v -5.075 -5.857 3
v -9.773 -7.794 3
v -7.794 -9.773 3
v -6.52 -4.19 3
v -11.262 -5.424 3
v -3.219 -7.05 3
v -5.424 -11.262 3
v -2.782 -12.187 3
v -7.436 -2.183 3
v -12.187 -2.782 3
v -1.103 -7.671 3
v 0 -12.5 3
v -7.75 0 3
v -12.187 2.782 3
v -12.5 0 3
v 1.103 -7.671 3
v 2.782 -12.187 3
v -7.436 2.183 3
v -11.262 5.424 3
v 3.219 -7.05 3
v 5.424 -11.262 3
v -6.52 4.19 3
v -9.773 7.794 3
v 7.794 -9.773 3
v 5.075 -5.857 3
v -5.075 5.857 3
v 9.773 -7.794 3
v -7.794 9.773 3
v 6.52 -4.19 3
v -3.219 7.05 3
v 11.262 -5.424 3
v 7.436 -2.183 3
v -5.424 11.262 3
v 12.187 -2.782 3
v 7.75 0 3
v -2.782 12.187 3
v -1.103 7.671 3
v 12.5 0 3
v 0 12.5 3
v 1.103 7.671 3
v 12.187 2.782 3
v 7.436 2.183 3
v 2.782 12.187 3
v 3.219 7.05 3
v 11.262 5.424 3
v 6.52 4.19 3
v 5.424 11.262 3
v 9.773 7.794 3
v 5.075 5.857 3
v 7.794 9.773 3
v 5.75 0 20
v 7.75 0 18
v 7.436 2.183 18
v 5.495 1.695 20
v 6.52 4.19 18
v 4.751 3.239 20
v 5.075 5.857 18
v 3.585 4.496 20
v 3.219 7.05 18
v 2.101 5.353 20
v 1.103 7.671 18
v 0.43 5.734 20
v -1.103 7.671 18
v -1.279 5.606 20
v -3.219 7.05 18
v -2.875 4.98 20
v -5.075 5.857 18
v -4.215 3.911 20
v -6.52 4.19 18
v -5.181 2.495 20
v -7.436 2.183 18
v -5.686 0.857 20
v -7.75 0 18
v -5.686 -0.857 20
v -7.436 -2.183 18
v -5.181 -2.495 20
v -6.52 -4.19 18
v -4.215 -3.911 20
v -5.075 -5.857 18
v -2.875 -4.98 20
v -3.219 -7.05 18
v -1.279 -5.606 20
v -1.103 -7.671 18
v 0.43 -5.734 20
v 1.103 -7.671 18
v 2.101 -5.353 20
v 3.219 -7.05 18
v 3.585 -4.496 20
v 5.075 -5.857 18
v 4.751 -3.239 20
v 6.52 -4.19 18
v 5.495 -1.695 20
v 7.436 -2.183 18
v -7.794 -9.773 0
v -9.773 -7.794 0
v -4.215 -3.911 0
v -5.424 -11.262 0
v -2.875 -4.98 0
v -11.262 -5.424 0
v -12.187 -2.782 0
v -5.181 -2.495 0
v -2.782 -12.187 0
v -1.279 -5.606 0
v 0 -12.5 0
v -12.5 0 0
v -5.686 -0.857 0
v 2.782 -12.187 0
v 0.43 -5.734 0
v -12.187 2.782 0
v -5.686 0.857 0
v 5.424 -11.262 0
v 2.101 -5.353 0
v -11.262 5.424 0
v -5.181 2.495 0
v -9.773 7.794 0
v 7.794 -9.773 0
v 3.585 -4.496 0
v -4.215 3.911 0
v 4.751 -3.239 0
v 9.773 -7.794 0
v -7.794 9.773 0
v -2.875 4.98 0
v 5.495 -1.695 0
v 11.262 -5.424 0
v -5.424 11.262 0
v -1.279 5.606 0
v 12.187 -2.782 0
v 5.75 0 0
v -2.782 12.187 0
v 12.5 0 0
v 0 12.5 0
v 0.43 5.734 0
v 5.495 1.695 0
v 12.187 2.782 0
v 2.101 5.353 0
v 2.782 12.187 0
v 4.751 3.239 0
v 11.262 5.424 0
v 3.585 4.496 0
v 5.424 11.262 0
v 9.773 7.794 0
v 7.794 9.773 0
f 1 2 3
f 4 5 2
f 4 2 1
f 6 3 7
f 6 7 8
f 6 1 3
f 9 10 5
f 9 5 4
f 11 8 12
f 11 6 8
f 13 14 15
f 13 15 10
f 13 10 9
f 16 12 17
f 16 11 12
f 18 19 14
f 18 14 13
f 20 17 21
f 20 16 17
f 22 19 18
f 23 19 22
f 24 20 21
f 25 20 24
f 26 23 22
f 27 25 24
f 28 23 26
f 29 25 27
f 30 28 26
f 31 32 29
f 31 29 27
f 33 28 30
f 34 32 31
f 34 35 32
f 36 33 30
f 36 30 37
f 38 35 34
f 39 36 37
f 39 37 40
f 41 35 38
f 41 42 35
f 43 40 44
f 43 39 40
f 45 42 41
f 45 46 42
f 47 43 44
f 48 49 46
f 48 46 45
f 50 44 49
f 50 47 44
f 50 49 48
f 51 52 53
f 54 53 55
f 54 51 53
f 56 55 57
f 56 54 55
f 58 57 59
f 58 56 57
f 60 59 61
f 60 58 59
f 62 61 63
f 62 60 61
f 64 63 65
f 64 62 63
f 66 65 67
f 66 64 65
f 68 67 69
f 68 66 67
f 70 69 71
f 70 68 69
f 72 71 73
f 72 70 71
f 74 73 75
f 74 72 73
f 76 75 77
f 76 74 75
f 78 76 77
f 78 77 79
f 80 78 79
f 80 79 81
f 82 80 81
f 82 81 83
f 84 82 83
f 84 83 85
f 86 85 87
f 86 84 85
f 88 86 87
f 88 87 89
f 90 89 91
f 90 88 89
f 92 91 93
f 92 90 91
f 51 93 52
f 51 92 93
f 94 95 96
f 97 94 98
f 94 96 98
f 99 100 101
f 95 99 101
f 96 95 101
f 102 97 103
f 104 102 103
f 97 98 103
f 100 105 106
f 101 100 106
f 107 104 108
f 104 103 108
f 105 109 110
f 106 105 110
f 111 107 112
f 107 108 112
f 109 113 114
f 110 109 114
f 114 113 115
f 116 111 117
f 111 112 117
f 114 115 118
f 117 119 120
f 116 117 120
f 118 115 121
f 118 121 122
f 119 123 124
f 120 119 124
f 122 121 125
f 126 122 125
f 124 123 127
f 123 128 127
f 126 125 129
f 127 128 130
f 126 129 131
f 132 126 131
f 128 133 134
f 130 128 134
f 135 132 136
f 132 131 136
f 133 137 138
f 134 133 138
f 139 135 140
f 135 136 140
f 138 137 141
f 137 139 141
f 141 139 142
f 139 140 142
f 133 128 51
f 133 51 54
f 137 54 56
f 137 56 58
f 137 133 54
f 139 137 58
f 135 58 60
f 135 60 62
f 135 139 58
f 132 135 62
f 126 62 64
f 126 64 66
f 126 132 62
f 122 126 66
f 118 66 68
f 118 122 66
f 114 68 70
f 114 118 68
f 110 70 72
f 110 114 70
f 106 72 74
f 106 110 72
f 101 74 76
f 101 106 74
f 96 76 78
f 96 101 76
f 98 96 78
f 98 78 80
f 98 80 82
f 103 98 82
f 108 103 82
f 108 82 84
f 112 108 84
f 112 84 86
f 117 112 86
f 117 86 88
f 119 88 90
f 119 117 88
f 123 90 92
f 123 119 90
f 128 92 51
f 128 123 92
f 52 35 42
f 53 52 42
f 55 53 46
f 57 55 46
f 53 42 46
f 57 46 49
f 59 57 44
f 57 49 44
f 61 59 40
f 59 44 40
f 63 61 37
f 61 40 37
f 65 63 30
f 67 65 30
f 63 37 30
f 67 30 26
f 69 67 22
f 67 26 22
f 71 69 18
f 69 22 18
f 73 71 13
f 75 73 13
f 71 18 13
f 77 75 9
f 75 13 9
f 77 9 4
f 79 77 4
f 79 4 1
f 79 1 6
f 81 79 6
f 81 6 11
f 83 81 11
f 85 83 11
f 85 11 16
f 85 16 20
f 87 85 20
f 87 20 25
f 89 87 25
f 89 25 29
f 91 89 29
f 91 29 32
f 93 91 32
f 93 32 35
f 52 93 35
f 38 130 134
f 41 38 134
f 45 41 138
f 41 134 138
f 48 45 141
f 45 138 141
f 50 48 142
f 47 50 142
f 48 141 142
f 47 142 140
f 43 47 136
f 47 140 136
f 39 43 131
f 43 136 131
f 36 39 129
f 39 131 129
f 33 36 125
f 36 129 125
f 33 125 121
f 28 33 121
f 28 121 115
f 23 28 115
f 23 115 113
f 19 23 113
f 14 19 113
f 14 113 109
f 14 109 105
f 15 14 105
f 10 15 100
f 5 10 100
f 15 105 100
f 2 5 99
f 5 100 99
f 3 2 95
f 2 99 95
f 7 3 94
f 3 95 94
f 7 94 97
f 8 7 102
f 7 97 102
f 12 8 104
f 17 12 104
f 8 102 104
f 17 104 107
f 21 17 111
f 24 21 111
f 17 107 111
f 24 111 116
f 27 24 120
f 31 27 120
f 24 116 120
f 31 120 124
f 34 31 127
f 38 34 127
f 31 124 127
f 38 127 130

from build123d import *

# Parameters (mm, degrees)
F0_R     = 7.75
F0_R_2   = 5.75
F1_DEPTH = 20
F2_R     = 12.5
F2_R_2   = 7.75
F3_DEPTH = 3
F4_SIZE  = 1.99999


# Not quite as in the source:
# - a fillet or chamfer is up to 0.001 mm smaller than in the source, because OpenCascade refuses the exact size


with BuildPart() as f1:
    # F0 (on Top) → F1 (new body)
    with BuildSketch(Plane.XY):
        Circle(F0_R)
        Circle(F0_R_2, mode=Mode.SUBTRACT)
    extrude(amount=F1_DEPTH)

    # F2 (on Top) → F3 (join)
    with BuildSketch(Plane.XY):
        Circle(F2_R)
        Circle(F2_R_2, mode=Mode.SUBTRACT)
    extrude(amount=F3_DEPTH)

    # F4 (size 2 in the source; OpenCascade refuses exactly that, so slightly less here)
    f4_edges = [f1.edges().sort_by_distance(p)[0] for p in [
        (-7.75, 0, 20),
    ]]
    chamfer(f4_edges, length=F4_SIZE)


solid = f1.part
